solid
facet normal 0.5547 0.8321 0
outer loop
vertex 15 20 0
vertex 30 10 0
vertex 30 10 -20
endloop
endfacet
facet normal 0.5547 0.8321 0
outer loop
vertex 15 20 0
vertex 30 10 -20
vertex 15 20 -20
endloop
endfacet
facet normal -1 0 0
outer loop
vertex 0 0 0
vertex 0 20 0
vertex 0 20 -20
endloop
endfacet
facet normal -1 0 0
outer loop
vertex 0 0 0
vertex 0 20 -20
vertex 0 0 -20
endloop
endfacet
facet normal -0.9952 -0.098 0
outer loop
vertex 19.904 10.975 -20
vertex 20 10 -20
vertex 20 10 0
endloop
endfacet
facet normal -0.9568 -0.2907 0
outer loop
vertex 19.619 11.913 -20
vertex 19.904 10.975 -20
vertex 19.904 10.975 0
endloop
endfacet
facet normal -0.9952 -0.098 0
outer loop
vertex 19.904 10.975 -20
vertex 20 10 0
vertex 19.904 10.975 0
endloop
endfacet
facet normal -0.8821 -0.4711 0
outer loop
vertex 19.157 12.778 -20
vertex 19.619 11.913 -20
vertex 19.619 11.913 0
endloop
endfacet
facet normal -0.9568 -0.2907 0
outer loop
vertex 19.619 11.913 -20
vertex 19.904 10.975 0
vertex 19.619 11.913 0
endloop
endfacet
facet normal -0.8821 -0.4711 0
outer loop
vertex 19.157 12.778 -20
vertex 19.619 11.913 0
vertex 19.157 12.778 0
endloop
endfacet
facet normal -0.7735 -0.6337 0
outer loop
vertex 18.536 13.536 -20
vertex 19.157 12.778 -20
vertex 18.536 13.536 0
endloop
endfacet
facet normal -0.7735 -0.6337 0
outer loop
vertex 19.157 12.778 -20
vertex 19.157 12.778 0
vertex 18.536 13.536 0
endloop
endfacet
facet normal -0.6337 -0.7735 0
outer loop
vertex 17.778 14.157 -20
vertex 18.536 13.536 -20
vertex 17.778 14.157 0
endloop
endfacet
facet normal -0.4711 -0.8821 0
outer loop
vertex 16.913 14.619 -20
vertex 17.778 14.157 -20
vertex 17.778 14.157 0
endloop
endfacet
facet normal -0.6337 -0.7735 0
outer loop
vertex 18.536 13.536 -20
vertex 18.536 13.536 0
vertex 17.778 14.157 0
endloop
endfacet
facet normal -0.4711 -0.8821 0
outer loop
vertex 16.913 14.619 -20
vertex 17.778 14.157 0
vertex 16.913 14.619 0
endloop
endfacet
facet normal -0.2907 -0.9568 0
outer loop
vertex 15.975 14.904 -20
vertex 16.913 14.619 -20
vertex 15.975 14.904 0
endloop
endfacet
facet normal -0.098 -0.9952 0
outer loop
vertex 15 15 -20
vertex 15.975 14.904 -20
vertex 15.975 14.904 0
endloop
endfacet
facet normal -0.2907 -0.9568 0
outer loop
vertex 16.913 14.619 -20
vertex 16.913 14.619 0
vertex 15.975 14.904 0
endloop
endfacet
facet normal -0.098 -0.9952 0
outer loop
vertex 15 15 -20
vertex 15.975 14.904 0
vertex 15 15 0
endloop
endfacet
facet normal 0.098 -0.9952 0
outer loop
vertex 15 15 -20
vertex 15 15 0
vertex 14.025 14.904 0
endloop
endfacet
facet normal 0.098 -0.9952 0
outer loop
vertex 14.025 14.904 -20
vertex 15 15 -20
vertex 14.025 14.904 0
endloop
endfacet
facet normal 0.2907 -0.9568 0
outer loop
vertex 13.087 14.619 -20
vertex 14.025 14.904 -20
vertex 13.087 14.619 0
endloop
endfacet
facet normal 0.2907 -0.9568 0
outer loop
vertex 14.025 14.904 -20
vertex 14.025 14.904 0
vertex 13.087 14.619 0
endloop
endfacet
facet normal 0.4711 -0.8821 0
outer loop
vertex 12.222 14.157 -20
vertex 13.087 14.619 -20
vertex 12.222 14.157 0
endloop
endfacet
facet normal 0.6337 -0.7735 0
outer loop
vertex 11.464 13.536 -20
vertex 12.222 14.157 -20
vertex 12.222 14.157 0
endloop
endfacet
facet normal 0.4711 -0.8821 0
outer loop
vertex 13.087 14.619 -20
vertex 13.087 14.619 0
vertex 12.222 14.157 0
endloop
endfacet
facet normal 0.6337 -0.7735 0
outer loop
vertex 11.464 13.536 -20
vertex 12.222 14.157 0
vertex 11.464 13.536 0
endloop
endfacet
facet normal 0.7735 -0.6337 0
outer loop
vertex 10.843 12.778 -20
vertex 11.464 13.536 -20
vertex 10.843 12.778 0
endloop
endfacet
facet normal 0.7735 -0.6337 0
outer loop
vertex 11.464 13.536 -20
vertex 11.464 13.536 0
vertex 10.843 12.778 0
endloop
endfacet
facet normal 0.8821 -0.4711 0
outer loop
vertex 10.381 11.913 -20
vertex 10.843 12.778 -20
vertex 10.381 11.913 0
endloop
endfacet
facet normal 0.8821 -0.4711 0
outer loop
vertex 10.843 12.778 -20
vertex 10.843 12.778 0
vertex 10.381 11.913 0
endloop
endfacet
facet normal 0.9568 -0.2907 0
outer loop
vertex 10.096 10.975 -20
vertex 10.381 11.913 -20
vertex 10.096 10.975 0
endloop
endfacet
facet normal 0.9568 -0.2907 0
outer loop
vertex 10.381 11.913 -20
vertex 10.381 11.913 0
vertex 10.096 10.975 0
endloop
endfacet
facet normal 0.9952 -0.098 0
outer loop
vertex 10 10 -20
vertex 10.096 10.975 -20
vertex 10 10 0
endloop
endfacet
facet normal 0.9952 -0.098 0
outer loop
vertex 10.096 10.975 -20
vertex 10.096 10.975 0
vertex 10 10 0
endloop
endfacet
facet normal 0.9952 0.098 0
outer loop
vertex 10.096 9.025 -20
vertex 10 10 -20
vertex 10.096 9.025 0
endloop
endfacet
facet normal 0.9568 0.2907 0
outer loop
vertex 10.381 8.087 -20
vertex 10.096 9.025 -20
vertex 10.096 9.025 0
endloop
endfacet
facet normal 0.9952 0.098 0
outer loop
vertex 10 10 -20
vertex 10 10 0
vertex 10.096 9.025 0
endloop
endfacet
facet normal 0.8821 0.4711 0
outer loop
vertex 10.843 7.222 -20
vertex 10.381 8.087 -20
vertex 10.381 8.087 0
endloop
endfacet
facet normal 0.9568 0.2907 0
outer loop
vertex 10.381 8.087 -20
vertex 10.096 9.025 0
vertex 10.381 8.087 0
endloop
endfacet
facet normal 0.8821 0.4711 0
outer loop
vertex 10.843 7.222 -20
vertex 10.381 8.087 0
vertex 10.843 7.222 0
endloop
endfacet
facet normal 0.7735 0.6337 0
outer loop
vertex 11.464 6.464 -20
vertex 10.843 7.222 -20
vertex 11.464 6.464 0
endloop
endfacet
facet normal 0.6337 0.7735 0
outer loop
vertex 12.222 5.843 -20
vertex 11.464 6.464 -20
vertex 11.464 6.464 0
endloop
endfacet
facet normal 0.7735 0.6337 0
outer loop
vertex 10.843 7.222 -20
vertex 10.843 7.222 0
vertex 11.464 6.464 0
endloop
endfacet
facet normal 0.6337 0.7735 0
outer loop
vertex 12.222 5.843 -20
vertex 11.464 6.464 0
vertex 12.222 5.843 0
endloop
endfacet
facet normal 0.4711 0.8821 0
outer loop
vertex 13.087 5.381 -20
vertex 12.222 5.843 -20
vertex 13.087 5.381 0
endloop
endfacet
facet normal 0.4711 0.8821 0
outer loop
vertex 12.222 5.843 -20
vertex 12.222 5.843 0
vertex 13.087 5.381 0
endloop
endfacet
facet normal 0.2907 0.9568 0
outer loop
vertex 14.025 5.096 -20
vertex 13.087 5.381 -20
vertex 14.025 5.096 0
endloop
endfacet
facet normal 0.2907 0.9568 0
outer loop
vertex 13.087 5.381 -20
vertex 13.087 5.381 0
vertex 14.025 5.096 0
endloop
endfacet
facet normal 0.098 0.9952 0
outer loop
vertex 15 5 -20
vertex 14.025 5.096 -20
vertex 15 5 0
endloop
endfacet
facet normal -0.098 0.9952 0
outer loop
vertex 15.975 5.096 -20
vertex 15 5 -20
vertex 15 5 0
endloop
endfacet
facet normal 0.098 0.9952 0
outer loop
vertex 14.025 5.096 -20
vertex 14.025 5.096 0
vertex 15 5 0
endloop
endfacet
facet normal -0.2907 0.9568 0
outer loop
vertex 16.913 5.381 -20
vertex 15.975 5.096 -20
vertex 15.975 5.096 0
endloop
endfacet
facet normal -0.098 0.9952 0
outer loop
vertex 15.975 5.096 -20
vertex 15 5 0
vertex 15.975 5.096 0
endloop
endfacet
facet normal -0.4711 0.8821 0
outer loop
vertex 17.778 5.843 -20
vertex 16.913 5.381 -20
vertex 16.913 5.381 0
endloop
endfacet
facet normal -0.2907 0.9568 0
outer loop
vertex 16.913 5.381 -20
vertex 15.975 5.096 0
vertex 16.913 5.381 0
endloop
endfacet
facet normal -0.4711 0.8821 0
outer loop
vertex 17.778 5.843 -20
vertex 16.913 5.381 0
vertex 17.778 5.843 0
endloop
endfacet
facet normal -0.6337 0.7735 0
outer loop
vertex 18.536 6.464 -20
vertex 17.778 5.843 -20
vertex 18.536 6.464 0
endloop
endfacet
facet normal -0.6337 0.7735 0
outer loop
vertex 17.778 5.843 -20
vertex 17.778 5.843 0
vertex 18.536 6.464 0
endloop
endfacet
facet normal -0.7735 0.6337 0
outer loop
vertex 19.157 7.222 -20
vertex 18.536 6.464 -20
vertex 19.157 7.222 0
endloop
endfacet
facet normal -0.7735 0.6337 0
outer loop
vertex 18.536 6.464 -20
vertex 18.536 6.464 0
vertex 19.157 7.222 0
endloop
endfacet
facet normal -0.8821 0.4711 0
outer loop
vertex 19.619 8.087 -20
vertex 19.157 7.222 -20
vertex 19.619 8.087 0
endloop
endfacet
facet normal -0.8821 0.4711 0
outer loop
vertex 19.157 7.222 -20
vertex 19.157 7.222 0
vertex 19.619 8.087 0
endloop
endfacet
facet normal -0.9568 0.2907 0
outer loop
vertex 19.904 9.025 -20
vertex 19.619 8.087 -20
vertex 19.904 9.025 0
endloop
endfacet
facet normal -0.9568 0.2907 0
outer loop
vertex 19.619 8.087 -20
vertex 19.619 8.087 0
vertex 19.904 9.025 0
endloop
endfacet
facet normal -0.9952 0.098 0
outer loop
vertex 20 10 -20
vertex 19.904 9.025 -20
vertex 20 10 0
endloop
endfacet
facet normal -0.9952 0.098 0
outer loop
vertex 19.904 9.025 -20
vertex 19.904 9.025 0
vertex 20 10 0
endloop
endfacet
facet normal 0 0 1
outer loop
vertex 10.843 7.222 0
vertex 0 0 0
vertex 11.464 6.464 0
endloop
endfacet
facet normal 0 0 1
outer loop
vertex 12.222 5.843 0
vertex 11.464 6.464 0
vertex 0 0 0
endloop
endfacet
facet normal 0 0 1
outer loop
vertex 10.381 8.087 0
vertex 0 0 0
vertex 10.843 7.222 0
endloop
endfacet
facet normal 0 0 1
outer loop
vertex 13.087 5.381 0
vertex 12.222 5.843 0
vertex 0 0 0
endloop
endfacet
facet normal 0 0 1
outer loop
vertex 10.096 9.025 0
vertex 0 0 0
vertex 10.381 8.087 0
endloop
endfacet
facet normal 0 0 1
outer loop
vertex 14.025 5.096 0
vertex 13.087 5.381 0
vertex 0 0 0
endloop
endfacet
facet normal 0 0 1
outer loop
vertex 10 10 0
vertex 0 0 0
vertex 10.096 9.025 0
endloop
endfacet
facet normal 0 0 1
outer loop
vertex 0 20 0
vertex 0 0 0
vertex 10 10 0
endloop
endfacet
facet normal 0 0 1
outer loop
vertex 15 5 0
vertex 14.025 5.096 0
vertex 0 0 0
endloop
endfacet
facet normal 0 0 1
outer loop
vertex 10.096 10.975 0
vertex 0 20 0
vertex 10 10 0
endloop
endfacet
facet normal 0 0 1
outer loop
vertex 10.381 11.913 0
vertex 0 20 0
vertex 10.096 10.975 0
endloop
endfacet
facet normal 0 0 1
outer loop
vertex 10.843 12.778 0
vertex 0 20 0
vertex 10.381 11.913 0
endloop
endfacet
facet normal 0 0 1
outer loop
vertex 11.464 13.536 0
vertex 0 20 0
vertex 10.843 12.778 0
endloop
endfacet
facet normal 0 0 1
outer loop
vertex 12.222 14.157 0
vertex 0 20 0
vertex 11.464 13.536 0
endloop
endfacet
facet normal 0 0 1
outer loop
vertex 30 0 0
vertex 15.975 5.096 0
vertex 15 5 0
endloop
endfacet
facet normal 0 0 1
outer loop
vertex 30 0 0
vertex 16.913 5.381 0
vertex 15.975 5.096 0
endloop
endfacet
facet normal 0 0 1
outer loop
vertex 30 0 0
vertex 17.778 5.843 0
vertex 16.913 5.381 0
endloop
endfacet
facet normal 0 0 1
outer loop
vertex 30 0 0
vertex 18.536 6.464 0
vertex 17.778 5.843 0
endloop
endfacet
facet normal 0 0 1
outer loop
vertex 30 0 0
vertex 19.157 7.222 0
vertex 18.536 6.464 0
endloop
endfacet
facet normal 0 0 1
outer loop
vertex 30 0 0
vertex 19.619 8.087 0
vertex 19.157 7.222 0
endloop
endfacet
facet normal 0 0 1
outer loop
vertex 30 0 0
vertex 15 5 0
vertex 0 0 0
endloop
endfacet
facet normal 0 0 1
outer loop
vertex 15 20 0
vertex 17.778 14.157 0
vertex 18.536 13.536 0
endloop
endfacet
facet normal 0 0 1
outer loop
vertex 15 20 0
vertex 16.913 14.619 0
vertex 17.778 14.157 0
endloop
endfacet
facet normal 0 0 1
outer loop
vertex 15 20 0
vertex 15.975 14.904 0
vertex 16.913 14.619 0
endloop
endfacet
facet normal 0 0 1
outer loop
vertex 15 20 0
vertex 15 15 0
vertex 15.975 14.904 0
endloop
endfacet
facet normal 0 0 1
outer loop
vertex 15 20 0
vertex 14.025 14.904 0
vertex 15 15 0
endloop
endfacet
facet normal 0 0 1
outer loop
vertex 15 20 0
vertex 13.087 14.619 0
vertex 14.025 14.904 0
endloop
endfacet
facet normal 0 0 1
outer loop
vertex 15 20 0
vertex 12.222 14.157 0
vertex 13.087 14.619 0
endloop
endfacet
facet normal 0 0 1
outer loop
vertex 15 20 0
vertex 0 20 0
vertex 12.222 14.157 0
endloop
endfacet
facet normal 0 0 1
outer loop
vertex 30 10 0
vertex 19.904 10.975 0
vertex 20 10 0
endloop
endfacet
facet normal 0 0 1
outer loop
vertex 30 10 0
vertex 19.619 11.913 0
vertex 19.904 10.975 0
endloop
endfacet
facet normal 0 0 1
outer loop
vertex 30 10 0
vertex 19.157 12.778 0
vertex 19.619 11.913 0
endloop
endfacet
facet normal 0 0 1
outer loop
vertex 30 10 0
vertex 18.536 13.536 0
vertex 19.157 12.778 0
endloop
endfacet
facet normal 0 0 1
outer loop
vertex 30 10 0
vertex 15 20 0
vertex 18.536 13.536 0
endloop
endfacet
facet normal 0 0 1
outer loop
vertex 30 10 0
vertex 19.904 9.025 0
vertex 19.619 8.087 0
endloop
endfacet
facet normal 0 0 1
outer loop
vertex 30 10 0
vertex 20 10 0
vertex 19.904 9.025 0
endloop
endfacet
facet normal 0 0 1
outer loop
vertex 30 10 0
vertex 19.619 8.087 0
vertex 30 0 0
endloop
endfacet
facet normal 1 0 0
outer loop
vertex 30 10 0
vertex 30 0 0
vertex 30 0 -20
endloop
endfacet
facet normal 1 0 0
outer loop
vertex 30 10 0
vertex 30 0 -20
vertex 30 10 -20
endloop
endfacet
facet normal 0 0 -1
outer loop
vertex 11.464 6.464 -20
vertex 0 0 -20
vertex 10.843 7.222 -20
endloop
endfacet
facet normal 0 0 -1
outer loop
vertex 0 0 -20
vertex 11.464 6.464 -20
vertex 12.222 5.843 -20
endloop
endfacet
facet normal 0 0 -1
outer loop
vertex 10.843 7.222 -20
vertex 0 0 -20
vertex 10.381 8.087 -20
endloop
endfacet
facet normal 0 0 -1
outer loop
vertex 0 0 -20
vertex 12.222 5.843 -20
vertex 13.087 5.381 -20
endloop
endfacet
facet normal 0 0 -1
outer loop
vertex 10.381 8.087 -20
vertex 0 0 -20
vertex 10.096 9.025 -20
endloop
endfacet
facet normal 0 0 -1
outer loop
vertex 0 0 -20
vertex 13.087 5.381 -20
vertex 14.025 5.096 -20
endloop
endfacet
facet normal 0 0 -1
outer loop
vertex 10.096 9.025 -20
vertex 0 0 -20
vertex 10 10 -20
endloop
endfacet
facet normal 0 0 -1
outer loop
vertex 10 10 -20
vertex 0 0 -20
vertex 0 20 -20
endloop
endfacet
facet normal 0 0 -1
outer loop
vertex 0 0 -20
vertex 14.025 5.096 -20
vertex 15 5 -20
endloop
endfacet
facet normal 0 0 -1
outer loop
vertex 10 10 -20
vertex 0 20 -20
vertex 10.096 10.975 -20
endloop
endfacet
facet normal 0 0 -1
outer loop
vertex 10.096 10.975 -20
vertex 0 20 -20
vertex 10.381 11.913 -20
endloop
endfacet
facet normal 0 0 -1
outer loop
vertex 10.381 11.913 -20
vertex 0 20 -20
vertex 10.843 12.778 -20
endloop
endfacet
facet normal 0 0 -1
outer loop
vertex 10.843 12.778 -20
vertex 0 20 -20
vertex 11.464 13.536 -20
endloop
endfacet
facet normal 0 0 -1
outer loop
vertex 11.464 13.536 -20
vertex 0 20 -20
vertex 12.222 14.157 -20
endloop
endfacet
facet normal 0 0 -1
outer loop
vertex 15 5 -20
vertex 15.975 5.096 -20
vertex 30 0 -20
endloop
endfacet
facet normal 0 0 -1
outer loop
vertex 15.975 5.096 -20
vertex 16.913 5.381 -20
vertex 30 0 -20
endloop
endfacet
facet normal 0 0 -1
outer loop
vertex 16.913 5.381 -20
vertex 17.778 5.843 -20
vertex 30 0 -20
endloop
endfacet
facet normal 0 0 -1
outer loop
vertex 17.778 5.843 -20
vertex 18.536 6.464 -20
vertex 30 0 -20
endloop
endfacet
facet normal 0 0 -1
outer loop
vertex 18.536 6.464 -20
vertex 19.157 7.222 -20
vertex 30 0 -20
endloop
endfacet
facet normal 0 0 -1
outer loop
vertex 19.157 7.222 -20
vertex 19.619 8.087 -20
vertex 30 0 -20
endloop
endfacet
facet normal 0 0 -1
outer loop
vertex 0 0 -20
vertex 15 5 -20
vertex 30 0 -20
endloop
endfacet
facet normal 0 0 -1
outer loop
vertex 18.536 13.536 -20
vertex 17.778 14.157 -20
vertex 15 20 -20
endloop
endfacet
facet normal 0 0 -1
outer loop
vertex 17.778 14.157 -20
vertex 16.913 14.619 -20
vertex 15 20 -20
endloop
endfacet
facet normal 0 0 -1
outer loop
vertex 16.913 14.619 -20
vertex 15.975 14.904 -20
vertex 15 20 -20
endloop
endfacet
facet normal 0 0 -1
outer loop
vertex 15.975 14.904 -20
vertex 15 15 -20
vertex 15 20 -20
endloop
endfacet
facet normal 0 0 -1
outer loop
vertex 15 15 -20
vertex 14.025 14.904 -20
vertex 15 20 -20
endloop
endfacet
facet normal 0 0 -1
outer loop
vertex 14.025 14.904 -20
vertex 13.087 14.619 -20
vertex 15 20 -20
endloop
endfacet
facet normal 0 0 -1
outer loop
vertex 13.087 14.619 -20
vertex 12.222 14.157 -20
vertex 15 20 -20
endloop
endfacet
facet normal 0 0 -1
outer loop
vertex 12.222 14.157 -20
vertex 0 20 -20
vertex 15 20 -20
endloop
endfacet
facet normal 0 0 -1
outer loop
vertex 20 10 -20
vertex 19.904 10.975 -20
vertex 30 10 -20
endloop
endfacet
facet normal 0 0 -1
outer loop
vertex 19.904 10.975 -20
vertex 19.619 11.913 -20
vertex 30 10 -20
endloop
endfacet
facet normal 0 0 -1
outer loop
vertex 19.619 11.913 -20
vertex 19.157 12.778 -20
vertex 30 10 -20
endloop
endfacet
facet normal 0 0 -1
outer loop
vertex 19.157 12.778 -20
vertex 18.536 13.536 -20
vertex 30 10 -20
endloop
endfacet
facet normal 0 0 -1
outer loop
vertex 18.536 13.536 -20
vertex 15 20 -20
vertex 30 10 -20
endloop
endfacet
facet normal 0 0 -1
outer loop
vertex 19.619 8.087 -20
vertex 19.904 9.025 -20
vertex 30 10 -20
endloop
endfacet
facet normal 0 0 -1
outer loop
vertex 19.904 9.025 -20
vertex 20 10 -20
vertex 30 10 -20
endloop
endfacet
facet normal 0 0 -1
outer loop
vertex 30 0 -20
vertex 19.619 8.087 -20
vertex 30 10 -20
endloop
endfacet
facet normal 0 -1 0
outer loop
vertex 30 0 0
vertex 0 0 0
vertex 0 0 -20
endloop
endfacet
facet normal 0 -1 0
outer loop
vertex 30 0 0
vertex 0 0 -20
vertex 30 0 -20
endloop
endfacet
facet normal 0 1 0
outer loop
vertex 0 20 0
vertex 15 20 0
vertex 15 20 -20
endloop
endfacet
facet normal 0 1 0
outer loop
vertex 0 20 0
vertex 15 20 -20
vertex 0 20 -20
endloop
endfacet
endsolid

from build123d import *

# Parameters (mm, degrees)
BOSS_EXTRUDE1_DEPTH = 20
SKETCH7_R           = 5
CUT_EXTRUDE1_DEPTH  = 20


with BuildPart() as part:
    # Sketch2 → Boss-Extrude1 (new body)
    with BuildSketch(Plane.XY):
        Polygon((0, 0), (30, 0), (30, 10), (15, 20), (0, 20), align=None)
    extrude(amount=-BOSS_EXTRUDE1_DEPTH)

    # Sketch7 → Cut-Extrude1 (cut)
    with BuildSketch(Plane.XY):
        with Locations((15, 10)):
            Circle(SKETCH7_R)
    extrude(amount=-CUT_EXTRUDE1_DEPTH, mode=Mode.SUBTRACT)


solid = part.part
